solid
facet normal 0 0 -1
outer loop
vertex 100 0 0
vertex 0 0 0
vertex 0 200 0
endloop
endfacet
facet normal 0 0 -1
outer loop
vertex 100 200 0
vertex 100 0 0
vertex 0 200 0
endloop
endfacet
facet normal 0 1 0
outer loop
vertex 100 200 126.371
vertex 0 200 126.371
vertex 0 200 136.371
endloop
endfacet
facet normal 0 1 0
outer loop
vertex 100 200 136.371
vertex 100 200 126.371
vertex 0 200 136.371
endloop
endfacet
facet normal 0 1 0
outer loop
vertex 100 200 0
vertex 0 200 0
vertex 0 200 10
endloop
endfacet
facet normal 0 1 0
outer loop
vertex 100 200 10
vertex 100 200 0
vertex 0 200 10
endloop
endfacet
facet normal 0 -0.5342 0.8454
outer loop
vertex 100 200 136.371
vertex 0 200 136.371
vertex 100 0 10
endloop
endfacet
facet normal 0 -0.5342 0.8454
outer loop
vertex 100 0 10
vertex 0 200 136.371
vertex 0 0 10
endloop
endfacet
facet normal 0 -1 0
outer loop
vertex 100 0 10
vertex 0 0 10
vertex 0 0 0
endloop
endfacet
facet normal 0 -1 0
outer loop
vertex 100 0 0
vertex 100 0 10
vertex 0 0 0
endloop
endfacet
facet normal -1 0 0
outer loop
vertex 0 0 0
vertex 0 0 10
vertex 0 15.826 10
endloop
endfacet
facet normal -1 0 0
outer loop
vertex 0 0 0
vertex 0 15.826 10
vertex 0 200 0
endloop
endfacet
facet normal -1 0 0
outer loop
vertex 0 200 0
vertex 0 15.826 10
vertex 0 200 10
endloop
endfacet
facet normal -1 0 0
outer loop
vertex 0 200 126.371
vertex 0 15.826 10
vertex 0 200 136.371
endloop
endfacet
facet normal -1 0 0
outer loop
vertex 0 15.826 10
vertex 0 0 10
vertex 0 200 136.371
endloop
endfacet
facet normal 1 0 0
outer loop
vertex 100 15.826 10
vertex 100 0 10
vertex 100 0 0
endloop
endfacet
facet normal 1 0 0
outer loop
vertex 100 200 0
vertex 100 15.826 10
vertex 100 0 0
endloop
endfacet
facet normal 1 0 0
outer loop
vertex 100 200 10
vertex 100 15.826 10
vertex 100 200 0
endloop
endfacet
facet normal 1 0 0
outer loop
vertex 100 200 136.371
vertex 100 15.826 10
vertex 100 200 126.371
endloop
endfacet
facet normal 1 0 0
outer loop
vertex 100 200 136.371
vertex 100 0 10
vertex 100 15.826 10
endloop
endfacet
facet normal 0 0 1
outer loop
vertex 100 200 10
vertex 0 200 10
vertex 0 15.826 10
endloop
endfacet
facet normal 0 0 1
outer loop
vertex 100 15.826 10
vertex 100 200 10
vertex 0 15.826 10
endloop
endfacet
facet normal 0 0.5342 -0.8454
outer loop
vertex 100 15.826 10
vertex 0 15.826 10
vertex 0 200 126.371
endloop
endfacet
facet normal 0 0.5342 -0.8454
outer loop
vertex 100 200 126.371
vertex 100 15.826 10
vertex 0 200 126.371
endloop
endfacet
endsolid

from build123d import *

# Parameters (mm, degrees)
F1_DEPTH = 100


with BuildPart() as f1:
    # F0 (on Right) → F1 (new body)
    with BuildSketch(Plane.YZ):
        Polygon((200, 136.370988), (0, 10), (15.826417, 10), (200, 126.370988), align=None)
        Polygon((0, 10), (0, 0), (15.826417, 10), align=None)
        Polygon((15.826417, 10), (0, 0), (200, 0), (200, 10), align=None)
    extrude(amount=F1_DEPTH)


solid = f1.part
